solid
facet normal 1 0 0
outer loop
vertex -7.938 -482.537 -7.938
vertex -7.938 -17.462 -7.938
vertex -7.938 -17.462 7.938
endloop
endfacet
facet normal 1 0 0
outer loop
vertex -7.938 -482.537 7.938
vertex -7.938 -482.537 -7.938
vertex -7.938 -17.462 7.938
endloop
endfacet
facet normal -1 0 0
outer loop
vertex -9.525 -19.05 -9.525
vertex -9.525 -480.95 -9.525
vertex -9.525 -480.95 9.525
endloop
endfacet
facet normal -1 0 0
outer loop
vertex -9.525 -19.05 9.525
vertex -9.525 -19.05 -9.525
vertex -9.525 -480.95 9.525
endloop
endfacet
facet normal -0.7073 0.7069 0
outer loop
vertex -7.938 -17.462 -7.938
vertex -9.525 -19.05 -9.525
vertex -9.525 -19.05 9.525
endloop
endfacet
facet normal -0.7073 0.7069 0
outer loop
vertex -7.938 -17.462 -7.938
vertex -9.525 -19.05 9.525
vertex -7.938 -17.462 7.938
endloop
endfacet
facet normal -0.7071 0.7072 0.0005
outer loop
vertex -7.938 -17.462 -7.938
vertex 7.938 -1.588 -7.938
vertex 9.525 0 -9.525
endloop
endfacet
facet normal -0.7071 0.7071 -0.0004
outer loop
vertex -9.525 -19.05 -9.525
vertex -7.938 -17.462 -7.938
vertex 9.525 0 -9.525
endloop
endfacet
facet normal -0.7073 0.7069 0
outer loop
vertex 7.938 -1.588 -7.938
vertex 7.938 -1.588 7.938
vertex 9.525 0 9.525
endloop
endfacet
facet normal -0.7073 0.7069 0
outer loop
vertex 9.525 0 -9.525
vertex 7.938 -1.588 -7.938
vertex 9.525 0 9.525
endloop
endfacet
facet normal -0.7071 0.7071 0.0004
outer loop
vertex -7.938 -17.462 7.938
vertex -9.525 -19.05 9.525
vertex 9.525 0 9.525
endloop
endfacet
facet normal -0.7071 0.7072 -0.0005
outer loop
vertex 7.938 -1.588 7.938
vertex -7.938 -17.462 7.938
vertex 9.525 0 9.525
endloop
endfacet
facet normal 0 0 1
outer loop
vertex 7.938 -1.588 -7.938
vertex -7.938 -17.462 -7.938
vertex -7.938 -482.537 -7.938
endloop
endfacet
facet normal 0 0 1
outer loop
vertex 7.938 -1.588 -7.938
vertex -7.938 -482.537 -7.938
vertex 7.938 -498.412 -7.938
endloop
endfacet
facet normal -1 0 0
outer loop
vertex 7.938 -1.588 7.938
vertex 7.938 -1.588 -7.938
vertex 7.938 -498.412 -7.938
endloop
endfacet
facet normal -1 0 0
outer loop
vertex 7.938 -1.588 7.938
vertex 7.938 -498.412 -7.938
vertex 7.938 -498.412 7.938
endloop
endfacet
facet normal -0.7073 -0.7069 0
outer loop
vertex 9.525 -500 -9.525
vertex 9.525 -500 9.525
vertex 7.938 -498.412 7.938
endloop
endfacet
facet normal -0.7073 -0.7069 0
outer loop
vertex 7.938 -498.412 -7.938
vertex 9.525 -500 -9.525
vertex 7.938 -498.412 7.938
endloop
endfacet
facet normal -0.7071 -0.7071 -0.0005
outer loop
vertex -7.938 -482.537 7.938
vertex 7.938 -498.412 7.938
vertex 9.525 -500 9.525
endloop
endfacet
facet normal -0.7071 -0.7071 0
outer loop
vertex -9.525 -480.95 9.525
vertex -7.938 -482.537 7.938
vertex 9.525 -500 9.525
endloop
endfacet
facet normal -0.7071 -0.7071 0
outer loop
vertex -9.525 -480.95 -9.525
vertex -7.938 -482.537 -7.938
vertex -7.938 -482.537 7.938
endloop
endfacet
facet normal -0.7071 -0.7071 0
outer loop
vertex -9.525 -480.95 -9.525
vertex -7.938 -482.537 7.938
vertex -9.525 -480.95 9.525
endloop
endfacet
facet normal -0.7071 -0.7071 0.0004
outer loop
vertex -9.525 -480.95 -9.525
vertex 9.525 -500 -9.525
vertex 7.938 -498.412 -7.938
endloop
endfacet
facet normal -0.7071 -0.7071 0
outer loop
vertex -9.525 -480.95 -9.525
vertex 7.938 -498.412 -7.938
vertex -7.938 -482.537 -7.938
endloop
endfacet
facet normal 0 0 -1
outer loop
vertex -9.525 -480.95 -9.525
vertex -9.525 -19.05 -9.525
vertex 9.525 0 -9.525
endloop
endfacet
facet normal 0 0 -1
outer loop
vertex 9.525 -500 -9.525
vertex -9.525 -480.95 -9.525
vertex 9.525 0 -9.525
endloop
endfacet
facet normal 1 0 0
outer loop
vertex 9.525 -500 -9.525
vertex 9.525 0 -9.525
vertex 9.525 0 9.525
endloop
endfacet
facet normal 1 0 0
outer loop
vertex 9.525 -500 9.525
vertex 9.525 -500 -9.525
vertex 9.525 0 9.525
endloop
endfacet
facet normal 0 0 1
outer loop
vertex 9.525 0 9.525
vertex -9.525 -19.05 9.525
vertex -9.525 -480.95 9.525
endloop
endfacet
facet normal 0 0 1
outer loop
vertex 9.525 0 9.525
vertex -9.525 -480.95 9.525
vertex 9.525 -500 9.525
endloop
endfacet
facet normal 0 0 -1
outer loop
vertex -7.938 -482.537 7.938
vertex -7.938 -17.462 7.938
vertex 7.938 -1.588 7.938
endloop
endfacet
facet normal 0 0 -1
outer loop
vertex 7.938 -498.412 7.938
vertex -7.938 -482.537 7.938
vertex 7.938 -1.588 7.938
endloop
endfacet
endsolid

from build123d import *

# Parameters (mm, degrees)
F0_W     = 19.05
F0_H     = 19.05
F0_W_2   = 15.875
F0_H_2   = 15.875
F1_DEPTH = 500
F3_DEPTH = 9.526
F4_DEPTH = 9.526


with BuildPart() as f1:
    # F0 (on Front) → F1 (new body)
    with BuildSketch(Plane.XZ):
        Rectangle(F0_W, F0_H)
        Rectangle(F0_W_2, F0_H_2, mode=Mode.SUBTRACT)
    extrude(amount=F1_DEPTH)

    # F2 (on Top) → F3 (cut, through all)
    with BuildSketch(Plane.XY):
        Polygon((9.525, 0), (-9.525, 0), (-9.525, -19.05), align=None)
        Polygon((-9.525, -480.95), (-9.525, -500), (9.525, -500), align=None)
    extrude(amount=F3_DEPTH, mode=Mode.SUBTRACT)

    # F2 (on Top) → F4 (cut, through all)
    with BuildSketch(Plane.XY):
        Polygon((9.525, 0), (-9.525, 0), (-9.525, -19.05), align=None)
        Polygon((-9.525, -480.95), (-9.525, -500), (9.525, -500), align=None)
    extrude(amount=-F4_DEPTH, mode=Mode.SUBTRACT)


solid = f1.part
